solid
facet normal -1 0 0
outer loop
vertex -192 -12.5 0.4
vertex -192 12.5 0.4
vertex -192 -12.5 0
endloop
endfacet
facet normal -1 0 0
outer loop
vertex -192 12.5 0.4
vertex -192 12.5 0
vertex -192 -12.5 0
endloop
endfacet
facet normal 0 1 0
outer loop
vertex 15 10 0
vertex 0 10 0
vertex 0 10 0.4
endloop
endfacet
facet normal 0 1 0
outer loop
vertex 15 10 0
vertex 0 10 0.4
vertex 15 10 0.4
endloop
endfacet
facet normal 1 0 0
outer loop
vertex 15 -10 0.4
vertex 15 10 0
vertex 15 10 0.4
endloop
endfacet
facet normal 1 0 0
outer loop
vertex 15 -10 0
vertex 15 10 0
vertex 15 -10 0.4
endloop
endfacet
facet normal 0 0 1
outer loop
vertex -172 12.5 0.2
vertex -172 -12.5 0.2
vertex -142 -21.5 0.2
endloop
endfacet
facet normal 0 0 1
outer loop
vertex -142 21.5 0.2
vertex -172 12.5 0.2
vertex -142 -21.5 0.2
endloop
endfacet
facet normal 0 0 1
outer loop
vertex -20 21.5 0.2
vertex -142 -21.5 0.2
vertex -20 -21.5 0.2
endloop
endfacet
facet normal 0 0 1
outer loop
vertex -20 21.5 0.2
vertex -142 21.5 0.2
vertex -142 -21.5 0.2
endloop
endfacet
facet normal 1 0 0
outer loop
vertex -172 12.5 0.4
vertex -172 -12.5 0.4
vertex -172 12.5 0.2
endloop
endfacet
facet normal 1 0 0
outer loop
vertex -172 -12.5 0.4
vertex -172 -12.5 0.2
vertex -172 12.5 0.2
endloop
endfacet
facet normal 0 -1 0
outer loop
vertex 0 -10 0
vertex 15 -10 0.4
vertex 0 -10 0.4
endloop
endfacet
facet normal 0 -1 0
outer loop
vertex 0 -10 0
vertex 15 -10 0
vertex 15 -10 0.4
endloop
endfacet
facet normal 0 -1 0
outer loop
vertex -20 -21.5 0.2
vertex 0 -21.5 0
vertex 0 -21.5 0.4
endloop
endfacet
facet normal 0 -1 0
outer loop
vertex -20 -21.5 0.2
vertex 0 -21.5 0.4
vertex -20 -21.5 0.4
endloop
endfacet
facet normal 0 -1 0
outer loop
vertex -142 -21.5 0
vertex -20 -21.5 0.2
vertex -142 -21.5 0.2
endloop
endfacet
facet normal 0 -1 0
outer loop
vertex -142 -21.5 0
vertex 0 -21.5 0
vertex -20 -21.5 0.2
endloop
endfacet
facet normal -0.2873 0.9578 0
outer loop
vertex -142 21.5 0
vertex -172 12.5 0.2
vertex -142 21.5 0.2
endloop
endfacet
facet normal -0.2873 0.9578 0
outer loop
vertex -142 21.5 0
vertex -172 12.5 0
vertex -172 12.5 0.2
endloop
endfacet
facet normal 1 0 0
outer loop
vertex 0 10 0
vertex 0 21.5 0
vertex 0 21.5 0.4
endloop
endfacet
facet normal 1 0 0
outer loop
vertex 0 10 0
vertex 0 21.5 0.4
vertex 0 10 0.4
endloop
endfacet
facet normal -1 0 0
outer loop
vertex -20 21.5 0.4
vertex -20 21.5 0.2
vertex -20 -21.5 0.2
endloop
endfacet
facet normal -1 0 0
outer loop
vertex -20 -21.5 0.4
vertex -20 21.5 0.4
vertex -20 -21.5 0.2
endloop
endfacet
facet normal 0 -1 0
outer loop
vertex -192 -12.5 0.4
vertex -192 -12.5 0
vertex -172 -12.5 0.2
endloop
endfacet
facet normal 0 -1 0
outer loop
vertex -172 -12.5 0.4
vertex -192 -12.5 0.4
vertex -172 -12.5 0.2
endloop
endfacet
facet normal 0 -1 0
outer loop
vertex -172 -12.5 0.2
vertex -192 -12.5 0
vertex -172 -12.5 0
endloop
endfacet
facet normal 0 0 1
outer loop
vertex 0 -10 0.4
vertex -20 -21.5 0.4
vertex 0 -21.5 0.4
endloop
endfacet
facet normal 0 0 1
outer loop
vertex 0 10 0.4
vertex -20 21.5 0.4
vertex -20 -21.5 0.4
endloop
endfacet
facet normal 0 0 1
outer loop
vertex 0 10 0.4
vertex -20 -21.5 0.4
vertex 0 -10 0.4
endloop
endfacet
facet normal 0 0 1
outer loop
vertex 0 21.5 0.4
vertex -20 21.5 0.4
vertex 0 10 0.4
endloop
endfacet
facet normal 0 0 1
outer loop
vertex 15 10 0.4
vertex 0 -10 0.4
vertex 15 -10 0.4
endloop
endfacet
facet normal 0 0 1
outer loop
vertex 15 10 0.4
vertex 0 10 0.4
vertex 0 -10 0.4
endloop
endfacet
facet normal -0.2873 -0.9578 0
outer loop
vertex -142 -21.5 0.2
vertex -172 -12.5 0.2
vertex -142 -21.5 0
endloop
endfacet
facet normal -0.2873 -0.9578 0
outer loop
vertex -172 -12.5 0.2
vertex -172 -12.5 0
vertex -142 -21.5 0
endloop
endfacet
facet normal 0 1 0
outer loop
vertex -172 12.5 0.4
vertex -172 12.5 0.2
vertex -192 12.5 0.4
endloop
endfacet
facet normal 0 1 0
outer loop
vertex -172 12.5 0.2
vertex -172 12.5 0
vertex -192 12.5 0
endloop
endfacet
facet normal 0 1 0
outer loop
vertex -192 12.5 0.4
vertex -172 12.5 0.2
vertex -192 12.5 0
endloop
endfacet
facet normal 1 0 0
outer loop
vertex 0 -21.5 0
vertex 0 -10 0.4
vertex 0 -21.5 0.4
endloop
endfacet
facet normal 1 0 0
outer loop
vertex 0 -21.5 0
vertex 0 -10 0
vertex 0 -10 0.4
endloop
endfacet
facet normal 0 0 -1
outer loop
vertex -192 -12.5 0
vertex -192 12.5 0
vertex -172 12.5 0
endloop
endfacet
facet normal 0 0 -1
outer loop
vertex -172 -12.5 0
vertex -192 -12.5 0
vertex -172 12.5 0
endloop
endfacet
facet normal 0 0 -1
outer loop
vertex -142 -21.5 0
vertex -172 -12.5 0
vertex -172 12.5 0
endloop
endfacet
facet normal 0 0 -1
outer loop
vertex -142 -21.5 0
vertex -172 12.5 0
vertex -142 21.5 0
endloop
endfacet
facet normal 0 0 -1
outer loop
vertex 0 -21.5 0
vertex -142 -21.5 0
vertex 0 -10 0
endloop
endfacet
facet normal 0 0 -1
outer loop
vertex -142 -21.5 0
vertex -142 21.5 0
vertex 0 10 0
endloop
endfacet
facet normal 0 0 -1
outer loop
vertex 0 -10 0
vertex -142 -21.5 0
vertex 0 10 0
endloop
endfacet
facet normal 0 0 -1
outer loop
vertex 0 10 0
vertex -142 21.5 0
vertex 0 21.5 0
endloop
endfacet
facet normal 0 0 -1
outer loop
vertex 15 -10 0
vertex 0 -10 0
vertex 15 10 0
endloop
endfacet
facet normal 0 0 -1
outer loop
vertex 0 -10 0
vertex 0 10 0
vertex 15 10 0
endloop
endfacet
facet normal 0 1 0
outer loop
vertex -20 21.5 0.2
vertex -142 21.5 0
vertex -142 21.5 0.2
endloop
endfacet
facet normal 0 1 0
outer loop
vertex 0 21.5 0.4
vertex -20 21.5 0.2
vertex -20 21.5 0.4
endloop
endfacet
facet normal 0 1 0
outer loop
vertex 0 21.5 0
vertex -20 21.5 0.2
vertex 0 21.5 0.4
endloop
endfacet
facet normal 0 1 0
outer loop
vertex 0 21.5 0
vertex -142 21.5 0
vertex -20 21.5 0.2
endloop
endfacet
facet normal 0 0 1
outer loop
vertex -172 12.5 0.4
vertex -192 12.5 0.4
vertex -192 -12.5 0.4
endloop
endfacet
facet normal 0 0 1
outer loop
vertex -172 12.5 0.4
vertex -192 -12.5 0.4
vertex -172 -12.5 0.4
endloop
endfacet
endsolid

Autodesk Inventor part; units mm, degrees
ref_plane "YZ Plane" through (0, 0, 0) normal (1, 0, 0) x (0, 1, 0)
ref_plane "XZ Plane" through (0, 0, 0) normal (0, 1, 0) x (-1, 0, 0)
ref_plane "XY Plane" through (0, 0, 0) normal (0, 0, 1) x (1, 0, 0)
sketch "Sketch1" plane through (0, 0, 0) normal (0, 0, 1) x (1, 0, 0)
  line L0 (-90, 21.5) -> (0, 21.5)
  line L1 (0, 21.5) -> (0, -21.5)
  line L2 (0, -21.5) -> (-90, -21.5)
  line L3 (-90, -21.5) -> (-90, 21.5)
  line L4 (-90, 21.5) -> (-142, 21.5)
  line L5 (-142, 21.5) -> (-142, -21.5)
  line L6 (-142, -21.5) -> (-90, -21.5)
  line L7 (-90, -21.5) -> (-90, 21.5)
  line L8 (-96, 21.5) -> (-96, -21.5)
  line L9 (-136, 21.5) -> (-136, -21.5)
  line L10 (-172, 39.3338) -> (-172, -34.4361) construction
  line L11 (-172, 12.5) -> (-192, 12.5)
  line L12 (-192, 12.5) -> (-192, -12.5)
  line L13 (-192, -12.5) -> (-172, -12.5)
  line L14 (-172, -12.5) -> (-172, 12.5)
  line L15 (-237.0195, 0) -> (143.1564, 0) construction
  line L16 (0, 148.4042) -> (0, -100.7046) construction
  line L17 (-172, 12.5) -> (-142, 21.5)
  line L18 (-172, -12.5) -> (-142, -21.5)
  line L19 (-20, 21.5) -> (-20, -21.5)
  line L20 (0, 10) -> (15, 10)
  line L21 (15, 10) -> (15, -10)
  line L22 (15, -10) -> (0, -10)
  line L23 (0, -10) -> (0, 10)
  line L24 (-63.7943, -15.2321) -> (-63.7943, 15.4179)
  line L25 (-63.7943, 15.4179) -> (-44.6843, 15.4179)
  line L26 (-44.6843, 15.4179) -> (-44.6843, -15.2321)
  line L27 (-44.6843, -15.2321) -> (-63.7943, -15.2321)
  line L28 (-86.4422, 19.0102) -> (-68.4422, 19.0102)
  line L29 (-68.4422, 19.0102) -> (-68.4422, -18.9898)
  line L30 (-68.4422, -18.9898) -> (-86.4422, -18.9898)
  line L31 (-86.4422, -18.9898) -> (-86.4422, 19.0102)
  line L32 (-41.3198, 14.7798) -> (-22.3198, 14.7798)
  line L33 (-22.3198, 14.7798) -> (-22.3198, -4.2202)
  line L34 (-22.3198, -4.2202) -> (-41.3198, -4.2202)
  line L35 (-41.3198, -4.2202) -> (-41.3198, 14.7798)
  line L36 (-41.3198, -7.7055) -> (-24.4109, -7.7055)
  line L37 (-24.4109, -7.7055) -> (-24.4109, -17)
  line L38 (-24.4109, -17) -> (-41.3198, -17)
  line L39 (-41.3198, -17) -> (-41.3198, -7.7055)
  point P0 (0, 0)
  point P1 (0, 0)
  point P2 (-172, 0)
  point P3 (15, 0)
  dimension "d0" = 90
  dimension "d1" = 43
  dimension "d2" = 6
  dimension "d3" = 6
  dimension "d5" = 40
  dimension "d6" = 30
  dimension "d7" = 20
  dimension "d8" = 25
  dimension "d23" = 20
  dimension "d34" = 15
  dimension "d35" = 20
  dimension "d36" = 19
  dimension "d37" = 19
  dimension "d38" = 30.65
  dimension "d39" = 19.11
  dimension "d40" = 38
  dimension "d41" = 18
extrude "Extrusion1" add sketch "Sketch1" along normal blind 0.2 contours L0 L19 L2 L3 | L3 L6 L8 L4 | L0 L1 L2 L19 | L8 L6 L9 L4 | L9 L6 L5 L4 | L20 L21 L22 L1 | L5 L18 L14 L17 | L14 L13 L12 L11 | L24 L25 L26 L27 | L28 L29 L30 L31 | L32 L33 L34 L35 | L36 L37 L38 L39
extrude "Extrusion3" add sketch "Sketch1" along normal blind 0.4 contours L0 L1 L2 L19 | L20 L21 L22 L1
extrude "Extrusion4" add sketch "Sketch1" along normal blind 0.4 contours L14 L13 L12 L11
equation "\"d19\" = material"
equation "\"d30\" = 2 * material"
equation "\"d32\" = 2 * material"
equation "\"material\" = 0.2"
properties part number "BandSide"
